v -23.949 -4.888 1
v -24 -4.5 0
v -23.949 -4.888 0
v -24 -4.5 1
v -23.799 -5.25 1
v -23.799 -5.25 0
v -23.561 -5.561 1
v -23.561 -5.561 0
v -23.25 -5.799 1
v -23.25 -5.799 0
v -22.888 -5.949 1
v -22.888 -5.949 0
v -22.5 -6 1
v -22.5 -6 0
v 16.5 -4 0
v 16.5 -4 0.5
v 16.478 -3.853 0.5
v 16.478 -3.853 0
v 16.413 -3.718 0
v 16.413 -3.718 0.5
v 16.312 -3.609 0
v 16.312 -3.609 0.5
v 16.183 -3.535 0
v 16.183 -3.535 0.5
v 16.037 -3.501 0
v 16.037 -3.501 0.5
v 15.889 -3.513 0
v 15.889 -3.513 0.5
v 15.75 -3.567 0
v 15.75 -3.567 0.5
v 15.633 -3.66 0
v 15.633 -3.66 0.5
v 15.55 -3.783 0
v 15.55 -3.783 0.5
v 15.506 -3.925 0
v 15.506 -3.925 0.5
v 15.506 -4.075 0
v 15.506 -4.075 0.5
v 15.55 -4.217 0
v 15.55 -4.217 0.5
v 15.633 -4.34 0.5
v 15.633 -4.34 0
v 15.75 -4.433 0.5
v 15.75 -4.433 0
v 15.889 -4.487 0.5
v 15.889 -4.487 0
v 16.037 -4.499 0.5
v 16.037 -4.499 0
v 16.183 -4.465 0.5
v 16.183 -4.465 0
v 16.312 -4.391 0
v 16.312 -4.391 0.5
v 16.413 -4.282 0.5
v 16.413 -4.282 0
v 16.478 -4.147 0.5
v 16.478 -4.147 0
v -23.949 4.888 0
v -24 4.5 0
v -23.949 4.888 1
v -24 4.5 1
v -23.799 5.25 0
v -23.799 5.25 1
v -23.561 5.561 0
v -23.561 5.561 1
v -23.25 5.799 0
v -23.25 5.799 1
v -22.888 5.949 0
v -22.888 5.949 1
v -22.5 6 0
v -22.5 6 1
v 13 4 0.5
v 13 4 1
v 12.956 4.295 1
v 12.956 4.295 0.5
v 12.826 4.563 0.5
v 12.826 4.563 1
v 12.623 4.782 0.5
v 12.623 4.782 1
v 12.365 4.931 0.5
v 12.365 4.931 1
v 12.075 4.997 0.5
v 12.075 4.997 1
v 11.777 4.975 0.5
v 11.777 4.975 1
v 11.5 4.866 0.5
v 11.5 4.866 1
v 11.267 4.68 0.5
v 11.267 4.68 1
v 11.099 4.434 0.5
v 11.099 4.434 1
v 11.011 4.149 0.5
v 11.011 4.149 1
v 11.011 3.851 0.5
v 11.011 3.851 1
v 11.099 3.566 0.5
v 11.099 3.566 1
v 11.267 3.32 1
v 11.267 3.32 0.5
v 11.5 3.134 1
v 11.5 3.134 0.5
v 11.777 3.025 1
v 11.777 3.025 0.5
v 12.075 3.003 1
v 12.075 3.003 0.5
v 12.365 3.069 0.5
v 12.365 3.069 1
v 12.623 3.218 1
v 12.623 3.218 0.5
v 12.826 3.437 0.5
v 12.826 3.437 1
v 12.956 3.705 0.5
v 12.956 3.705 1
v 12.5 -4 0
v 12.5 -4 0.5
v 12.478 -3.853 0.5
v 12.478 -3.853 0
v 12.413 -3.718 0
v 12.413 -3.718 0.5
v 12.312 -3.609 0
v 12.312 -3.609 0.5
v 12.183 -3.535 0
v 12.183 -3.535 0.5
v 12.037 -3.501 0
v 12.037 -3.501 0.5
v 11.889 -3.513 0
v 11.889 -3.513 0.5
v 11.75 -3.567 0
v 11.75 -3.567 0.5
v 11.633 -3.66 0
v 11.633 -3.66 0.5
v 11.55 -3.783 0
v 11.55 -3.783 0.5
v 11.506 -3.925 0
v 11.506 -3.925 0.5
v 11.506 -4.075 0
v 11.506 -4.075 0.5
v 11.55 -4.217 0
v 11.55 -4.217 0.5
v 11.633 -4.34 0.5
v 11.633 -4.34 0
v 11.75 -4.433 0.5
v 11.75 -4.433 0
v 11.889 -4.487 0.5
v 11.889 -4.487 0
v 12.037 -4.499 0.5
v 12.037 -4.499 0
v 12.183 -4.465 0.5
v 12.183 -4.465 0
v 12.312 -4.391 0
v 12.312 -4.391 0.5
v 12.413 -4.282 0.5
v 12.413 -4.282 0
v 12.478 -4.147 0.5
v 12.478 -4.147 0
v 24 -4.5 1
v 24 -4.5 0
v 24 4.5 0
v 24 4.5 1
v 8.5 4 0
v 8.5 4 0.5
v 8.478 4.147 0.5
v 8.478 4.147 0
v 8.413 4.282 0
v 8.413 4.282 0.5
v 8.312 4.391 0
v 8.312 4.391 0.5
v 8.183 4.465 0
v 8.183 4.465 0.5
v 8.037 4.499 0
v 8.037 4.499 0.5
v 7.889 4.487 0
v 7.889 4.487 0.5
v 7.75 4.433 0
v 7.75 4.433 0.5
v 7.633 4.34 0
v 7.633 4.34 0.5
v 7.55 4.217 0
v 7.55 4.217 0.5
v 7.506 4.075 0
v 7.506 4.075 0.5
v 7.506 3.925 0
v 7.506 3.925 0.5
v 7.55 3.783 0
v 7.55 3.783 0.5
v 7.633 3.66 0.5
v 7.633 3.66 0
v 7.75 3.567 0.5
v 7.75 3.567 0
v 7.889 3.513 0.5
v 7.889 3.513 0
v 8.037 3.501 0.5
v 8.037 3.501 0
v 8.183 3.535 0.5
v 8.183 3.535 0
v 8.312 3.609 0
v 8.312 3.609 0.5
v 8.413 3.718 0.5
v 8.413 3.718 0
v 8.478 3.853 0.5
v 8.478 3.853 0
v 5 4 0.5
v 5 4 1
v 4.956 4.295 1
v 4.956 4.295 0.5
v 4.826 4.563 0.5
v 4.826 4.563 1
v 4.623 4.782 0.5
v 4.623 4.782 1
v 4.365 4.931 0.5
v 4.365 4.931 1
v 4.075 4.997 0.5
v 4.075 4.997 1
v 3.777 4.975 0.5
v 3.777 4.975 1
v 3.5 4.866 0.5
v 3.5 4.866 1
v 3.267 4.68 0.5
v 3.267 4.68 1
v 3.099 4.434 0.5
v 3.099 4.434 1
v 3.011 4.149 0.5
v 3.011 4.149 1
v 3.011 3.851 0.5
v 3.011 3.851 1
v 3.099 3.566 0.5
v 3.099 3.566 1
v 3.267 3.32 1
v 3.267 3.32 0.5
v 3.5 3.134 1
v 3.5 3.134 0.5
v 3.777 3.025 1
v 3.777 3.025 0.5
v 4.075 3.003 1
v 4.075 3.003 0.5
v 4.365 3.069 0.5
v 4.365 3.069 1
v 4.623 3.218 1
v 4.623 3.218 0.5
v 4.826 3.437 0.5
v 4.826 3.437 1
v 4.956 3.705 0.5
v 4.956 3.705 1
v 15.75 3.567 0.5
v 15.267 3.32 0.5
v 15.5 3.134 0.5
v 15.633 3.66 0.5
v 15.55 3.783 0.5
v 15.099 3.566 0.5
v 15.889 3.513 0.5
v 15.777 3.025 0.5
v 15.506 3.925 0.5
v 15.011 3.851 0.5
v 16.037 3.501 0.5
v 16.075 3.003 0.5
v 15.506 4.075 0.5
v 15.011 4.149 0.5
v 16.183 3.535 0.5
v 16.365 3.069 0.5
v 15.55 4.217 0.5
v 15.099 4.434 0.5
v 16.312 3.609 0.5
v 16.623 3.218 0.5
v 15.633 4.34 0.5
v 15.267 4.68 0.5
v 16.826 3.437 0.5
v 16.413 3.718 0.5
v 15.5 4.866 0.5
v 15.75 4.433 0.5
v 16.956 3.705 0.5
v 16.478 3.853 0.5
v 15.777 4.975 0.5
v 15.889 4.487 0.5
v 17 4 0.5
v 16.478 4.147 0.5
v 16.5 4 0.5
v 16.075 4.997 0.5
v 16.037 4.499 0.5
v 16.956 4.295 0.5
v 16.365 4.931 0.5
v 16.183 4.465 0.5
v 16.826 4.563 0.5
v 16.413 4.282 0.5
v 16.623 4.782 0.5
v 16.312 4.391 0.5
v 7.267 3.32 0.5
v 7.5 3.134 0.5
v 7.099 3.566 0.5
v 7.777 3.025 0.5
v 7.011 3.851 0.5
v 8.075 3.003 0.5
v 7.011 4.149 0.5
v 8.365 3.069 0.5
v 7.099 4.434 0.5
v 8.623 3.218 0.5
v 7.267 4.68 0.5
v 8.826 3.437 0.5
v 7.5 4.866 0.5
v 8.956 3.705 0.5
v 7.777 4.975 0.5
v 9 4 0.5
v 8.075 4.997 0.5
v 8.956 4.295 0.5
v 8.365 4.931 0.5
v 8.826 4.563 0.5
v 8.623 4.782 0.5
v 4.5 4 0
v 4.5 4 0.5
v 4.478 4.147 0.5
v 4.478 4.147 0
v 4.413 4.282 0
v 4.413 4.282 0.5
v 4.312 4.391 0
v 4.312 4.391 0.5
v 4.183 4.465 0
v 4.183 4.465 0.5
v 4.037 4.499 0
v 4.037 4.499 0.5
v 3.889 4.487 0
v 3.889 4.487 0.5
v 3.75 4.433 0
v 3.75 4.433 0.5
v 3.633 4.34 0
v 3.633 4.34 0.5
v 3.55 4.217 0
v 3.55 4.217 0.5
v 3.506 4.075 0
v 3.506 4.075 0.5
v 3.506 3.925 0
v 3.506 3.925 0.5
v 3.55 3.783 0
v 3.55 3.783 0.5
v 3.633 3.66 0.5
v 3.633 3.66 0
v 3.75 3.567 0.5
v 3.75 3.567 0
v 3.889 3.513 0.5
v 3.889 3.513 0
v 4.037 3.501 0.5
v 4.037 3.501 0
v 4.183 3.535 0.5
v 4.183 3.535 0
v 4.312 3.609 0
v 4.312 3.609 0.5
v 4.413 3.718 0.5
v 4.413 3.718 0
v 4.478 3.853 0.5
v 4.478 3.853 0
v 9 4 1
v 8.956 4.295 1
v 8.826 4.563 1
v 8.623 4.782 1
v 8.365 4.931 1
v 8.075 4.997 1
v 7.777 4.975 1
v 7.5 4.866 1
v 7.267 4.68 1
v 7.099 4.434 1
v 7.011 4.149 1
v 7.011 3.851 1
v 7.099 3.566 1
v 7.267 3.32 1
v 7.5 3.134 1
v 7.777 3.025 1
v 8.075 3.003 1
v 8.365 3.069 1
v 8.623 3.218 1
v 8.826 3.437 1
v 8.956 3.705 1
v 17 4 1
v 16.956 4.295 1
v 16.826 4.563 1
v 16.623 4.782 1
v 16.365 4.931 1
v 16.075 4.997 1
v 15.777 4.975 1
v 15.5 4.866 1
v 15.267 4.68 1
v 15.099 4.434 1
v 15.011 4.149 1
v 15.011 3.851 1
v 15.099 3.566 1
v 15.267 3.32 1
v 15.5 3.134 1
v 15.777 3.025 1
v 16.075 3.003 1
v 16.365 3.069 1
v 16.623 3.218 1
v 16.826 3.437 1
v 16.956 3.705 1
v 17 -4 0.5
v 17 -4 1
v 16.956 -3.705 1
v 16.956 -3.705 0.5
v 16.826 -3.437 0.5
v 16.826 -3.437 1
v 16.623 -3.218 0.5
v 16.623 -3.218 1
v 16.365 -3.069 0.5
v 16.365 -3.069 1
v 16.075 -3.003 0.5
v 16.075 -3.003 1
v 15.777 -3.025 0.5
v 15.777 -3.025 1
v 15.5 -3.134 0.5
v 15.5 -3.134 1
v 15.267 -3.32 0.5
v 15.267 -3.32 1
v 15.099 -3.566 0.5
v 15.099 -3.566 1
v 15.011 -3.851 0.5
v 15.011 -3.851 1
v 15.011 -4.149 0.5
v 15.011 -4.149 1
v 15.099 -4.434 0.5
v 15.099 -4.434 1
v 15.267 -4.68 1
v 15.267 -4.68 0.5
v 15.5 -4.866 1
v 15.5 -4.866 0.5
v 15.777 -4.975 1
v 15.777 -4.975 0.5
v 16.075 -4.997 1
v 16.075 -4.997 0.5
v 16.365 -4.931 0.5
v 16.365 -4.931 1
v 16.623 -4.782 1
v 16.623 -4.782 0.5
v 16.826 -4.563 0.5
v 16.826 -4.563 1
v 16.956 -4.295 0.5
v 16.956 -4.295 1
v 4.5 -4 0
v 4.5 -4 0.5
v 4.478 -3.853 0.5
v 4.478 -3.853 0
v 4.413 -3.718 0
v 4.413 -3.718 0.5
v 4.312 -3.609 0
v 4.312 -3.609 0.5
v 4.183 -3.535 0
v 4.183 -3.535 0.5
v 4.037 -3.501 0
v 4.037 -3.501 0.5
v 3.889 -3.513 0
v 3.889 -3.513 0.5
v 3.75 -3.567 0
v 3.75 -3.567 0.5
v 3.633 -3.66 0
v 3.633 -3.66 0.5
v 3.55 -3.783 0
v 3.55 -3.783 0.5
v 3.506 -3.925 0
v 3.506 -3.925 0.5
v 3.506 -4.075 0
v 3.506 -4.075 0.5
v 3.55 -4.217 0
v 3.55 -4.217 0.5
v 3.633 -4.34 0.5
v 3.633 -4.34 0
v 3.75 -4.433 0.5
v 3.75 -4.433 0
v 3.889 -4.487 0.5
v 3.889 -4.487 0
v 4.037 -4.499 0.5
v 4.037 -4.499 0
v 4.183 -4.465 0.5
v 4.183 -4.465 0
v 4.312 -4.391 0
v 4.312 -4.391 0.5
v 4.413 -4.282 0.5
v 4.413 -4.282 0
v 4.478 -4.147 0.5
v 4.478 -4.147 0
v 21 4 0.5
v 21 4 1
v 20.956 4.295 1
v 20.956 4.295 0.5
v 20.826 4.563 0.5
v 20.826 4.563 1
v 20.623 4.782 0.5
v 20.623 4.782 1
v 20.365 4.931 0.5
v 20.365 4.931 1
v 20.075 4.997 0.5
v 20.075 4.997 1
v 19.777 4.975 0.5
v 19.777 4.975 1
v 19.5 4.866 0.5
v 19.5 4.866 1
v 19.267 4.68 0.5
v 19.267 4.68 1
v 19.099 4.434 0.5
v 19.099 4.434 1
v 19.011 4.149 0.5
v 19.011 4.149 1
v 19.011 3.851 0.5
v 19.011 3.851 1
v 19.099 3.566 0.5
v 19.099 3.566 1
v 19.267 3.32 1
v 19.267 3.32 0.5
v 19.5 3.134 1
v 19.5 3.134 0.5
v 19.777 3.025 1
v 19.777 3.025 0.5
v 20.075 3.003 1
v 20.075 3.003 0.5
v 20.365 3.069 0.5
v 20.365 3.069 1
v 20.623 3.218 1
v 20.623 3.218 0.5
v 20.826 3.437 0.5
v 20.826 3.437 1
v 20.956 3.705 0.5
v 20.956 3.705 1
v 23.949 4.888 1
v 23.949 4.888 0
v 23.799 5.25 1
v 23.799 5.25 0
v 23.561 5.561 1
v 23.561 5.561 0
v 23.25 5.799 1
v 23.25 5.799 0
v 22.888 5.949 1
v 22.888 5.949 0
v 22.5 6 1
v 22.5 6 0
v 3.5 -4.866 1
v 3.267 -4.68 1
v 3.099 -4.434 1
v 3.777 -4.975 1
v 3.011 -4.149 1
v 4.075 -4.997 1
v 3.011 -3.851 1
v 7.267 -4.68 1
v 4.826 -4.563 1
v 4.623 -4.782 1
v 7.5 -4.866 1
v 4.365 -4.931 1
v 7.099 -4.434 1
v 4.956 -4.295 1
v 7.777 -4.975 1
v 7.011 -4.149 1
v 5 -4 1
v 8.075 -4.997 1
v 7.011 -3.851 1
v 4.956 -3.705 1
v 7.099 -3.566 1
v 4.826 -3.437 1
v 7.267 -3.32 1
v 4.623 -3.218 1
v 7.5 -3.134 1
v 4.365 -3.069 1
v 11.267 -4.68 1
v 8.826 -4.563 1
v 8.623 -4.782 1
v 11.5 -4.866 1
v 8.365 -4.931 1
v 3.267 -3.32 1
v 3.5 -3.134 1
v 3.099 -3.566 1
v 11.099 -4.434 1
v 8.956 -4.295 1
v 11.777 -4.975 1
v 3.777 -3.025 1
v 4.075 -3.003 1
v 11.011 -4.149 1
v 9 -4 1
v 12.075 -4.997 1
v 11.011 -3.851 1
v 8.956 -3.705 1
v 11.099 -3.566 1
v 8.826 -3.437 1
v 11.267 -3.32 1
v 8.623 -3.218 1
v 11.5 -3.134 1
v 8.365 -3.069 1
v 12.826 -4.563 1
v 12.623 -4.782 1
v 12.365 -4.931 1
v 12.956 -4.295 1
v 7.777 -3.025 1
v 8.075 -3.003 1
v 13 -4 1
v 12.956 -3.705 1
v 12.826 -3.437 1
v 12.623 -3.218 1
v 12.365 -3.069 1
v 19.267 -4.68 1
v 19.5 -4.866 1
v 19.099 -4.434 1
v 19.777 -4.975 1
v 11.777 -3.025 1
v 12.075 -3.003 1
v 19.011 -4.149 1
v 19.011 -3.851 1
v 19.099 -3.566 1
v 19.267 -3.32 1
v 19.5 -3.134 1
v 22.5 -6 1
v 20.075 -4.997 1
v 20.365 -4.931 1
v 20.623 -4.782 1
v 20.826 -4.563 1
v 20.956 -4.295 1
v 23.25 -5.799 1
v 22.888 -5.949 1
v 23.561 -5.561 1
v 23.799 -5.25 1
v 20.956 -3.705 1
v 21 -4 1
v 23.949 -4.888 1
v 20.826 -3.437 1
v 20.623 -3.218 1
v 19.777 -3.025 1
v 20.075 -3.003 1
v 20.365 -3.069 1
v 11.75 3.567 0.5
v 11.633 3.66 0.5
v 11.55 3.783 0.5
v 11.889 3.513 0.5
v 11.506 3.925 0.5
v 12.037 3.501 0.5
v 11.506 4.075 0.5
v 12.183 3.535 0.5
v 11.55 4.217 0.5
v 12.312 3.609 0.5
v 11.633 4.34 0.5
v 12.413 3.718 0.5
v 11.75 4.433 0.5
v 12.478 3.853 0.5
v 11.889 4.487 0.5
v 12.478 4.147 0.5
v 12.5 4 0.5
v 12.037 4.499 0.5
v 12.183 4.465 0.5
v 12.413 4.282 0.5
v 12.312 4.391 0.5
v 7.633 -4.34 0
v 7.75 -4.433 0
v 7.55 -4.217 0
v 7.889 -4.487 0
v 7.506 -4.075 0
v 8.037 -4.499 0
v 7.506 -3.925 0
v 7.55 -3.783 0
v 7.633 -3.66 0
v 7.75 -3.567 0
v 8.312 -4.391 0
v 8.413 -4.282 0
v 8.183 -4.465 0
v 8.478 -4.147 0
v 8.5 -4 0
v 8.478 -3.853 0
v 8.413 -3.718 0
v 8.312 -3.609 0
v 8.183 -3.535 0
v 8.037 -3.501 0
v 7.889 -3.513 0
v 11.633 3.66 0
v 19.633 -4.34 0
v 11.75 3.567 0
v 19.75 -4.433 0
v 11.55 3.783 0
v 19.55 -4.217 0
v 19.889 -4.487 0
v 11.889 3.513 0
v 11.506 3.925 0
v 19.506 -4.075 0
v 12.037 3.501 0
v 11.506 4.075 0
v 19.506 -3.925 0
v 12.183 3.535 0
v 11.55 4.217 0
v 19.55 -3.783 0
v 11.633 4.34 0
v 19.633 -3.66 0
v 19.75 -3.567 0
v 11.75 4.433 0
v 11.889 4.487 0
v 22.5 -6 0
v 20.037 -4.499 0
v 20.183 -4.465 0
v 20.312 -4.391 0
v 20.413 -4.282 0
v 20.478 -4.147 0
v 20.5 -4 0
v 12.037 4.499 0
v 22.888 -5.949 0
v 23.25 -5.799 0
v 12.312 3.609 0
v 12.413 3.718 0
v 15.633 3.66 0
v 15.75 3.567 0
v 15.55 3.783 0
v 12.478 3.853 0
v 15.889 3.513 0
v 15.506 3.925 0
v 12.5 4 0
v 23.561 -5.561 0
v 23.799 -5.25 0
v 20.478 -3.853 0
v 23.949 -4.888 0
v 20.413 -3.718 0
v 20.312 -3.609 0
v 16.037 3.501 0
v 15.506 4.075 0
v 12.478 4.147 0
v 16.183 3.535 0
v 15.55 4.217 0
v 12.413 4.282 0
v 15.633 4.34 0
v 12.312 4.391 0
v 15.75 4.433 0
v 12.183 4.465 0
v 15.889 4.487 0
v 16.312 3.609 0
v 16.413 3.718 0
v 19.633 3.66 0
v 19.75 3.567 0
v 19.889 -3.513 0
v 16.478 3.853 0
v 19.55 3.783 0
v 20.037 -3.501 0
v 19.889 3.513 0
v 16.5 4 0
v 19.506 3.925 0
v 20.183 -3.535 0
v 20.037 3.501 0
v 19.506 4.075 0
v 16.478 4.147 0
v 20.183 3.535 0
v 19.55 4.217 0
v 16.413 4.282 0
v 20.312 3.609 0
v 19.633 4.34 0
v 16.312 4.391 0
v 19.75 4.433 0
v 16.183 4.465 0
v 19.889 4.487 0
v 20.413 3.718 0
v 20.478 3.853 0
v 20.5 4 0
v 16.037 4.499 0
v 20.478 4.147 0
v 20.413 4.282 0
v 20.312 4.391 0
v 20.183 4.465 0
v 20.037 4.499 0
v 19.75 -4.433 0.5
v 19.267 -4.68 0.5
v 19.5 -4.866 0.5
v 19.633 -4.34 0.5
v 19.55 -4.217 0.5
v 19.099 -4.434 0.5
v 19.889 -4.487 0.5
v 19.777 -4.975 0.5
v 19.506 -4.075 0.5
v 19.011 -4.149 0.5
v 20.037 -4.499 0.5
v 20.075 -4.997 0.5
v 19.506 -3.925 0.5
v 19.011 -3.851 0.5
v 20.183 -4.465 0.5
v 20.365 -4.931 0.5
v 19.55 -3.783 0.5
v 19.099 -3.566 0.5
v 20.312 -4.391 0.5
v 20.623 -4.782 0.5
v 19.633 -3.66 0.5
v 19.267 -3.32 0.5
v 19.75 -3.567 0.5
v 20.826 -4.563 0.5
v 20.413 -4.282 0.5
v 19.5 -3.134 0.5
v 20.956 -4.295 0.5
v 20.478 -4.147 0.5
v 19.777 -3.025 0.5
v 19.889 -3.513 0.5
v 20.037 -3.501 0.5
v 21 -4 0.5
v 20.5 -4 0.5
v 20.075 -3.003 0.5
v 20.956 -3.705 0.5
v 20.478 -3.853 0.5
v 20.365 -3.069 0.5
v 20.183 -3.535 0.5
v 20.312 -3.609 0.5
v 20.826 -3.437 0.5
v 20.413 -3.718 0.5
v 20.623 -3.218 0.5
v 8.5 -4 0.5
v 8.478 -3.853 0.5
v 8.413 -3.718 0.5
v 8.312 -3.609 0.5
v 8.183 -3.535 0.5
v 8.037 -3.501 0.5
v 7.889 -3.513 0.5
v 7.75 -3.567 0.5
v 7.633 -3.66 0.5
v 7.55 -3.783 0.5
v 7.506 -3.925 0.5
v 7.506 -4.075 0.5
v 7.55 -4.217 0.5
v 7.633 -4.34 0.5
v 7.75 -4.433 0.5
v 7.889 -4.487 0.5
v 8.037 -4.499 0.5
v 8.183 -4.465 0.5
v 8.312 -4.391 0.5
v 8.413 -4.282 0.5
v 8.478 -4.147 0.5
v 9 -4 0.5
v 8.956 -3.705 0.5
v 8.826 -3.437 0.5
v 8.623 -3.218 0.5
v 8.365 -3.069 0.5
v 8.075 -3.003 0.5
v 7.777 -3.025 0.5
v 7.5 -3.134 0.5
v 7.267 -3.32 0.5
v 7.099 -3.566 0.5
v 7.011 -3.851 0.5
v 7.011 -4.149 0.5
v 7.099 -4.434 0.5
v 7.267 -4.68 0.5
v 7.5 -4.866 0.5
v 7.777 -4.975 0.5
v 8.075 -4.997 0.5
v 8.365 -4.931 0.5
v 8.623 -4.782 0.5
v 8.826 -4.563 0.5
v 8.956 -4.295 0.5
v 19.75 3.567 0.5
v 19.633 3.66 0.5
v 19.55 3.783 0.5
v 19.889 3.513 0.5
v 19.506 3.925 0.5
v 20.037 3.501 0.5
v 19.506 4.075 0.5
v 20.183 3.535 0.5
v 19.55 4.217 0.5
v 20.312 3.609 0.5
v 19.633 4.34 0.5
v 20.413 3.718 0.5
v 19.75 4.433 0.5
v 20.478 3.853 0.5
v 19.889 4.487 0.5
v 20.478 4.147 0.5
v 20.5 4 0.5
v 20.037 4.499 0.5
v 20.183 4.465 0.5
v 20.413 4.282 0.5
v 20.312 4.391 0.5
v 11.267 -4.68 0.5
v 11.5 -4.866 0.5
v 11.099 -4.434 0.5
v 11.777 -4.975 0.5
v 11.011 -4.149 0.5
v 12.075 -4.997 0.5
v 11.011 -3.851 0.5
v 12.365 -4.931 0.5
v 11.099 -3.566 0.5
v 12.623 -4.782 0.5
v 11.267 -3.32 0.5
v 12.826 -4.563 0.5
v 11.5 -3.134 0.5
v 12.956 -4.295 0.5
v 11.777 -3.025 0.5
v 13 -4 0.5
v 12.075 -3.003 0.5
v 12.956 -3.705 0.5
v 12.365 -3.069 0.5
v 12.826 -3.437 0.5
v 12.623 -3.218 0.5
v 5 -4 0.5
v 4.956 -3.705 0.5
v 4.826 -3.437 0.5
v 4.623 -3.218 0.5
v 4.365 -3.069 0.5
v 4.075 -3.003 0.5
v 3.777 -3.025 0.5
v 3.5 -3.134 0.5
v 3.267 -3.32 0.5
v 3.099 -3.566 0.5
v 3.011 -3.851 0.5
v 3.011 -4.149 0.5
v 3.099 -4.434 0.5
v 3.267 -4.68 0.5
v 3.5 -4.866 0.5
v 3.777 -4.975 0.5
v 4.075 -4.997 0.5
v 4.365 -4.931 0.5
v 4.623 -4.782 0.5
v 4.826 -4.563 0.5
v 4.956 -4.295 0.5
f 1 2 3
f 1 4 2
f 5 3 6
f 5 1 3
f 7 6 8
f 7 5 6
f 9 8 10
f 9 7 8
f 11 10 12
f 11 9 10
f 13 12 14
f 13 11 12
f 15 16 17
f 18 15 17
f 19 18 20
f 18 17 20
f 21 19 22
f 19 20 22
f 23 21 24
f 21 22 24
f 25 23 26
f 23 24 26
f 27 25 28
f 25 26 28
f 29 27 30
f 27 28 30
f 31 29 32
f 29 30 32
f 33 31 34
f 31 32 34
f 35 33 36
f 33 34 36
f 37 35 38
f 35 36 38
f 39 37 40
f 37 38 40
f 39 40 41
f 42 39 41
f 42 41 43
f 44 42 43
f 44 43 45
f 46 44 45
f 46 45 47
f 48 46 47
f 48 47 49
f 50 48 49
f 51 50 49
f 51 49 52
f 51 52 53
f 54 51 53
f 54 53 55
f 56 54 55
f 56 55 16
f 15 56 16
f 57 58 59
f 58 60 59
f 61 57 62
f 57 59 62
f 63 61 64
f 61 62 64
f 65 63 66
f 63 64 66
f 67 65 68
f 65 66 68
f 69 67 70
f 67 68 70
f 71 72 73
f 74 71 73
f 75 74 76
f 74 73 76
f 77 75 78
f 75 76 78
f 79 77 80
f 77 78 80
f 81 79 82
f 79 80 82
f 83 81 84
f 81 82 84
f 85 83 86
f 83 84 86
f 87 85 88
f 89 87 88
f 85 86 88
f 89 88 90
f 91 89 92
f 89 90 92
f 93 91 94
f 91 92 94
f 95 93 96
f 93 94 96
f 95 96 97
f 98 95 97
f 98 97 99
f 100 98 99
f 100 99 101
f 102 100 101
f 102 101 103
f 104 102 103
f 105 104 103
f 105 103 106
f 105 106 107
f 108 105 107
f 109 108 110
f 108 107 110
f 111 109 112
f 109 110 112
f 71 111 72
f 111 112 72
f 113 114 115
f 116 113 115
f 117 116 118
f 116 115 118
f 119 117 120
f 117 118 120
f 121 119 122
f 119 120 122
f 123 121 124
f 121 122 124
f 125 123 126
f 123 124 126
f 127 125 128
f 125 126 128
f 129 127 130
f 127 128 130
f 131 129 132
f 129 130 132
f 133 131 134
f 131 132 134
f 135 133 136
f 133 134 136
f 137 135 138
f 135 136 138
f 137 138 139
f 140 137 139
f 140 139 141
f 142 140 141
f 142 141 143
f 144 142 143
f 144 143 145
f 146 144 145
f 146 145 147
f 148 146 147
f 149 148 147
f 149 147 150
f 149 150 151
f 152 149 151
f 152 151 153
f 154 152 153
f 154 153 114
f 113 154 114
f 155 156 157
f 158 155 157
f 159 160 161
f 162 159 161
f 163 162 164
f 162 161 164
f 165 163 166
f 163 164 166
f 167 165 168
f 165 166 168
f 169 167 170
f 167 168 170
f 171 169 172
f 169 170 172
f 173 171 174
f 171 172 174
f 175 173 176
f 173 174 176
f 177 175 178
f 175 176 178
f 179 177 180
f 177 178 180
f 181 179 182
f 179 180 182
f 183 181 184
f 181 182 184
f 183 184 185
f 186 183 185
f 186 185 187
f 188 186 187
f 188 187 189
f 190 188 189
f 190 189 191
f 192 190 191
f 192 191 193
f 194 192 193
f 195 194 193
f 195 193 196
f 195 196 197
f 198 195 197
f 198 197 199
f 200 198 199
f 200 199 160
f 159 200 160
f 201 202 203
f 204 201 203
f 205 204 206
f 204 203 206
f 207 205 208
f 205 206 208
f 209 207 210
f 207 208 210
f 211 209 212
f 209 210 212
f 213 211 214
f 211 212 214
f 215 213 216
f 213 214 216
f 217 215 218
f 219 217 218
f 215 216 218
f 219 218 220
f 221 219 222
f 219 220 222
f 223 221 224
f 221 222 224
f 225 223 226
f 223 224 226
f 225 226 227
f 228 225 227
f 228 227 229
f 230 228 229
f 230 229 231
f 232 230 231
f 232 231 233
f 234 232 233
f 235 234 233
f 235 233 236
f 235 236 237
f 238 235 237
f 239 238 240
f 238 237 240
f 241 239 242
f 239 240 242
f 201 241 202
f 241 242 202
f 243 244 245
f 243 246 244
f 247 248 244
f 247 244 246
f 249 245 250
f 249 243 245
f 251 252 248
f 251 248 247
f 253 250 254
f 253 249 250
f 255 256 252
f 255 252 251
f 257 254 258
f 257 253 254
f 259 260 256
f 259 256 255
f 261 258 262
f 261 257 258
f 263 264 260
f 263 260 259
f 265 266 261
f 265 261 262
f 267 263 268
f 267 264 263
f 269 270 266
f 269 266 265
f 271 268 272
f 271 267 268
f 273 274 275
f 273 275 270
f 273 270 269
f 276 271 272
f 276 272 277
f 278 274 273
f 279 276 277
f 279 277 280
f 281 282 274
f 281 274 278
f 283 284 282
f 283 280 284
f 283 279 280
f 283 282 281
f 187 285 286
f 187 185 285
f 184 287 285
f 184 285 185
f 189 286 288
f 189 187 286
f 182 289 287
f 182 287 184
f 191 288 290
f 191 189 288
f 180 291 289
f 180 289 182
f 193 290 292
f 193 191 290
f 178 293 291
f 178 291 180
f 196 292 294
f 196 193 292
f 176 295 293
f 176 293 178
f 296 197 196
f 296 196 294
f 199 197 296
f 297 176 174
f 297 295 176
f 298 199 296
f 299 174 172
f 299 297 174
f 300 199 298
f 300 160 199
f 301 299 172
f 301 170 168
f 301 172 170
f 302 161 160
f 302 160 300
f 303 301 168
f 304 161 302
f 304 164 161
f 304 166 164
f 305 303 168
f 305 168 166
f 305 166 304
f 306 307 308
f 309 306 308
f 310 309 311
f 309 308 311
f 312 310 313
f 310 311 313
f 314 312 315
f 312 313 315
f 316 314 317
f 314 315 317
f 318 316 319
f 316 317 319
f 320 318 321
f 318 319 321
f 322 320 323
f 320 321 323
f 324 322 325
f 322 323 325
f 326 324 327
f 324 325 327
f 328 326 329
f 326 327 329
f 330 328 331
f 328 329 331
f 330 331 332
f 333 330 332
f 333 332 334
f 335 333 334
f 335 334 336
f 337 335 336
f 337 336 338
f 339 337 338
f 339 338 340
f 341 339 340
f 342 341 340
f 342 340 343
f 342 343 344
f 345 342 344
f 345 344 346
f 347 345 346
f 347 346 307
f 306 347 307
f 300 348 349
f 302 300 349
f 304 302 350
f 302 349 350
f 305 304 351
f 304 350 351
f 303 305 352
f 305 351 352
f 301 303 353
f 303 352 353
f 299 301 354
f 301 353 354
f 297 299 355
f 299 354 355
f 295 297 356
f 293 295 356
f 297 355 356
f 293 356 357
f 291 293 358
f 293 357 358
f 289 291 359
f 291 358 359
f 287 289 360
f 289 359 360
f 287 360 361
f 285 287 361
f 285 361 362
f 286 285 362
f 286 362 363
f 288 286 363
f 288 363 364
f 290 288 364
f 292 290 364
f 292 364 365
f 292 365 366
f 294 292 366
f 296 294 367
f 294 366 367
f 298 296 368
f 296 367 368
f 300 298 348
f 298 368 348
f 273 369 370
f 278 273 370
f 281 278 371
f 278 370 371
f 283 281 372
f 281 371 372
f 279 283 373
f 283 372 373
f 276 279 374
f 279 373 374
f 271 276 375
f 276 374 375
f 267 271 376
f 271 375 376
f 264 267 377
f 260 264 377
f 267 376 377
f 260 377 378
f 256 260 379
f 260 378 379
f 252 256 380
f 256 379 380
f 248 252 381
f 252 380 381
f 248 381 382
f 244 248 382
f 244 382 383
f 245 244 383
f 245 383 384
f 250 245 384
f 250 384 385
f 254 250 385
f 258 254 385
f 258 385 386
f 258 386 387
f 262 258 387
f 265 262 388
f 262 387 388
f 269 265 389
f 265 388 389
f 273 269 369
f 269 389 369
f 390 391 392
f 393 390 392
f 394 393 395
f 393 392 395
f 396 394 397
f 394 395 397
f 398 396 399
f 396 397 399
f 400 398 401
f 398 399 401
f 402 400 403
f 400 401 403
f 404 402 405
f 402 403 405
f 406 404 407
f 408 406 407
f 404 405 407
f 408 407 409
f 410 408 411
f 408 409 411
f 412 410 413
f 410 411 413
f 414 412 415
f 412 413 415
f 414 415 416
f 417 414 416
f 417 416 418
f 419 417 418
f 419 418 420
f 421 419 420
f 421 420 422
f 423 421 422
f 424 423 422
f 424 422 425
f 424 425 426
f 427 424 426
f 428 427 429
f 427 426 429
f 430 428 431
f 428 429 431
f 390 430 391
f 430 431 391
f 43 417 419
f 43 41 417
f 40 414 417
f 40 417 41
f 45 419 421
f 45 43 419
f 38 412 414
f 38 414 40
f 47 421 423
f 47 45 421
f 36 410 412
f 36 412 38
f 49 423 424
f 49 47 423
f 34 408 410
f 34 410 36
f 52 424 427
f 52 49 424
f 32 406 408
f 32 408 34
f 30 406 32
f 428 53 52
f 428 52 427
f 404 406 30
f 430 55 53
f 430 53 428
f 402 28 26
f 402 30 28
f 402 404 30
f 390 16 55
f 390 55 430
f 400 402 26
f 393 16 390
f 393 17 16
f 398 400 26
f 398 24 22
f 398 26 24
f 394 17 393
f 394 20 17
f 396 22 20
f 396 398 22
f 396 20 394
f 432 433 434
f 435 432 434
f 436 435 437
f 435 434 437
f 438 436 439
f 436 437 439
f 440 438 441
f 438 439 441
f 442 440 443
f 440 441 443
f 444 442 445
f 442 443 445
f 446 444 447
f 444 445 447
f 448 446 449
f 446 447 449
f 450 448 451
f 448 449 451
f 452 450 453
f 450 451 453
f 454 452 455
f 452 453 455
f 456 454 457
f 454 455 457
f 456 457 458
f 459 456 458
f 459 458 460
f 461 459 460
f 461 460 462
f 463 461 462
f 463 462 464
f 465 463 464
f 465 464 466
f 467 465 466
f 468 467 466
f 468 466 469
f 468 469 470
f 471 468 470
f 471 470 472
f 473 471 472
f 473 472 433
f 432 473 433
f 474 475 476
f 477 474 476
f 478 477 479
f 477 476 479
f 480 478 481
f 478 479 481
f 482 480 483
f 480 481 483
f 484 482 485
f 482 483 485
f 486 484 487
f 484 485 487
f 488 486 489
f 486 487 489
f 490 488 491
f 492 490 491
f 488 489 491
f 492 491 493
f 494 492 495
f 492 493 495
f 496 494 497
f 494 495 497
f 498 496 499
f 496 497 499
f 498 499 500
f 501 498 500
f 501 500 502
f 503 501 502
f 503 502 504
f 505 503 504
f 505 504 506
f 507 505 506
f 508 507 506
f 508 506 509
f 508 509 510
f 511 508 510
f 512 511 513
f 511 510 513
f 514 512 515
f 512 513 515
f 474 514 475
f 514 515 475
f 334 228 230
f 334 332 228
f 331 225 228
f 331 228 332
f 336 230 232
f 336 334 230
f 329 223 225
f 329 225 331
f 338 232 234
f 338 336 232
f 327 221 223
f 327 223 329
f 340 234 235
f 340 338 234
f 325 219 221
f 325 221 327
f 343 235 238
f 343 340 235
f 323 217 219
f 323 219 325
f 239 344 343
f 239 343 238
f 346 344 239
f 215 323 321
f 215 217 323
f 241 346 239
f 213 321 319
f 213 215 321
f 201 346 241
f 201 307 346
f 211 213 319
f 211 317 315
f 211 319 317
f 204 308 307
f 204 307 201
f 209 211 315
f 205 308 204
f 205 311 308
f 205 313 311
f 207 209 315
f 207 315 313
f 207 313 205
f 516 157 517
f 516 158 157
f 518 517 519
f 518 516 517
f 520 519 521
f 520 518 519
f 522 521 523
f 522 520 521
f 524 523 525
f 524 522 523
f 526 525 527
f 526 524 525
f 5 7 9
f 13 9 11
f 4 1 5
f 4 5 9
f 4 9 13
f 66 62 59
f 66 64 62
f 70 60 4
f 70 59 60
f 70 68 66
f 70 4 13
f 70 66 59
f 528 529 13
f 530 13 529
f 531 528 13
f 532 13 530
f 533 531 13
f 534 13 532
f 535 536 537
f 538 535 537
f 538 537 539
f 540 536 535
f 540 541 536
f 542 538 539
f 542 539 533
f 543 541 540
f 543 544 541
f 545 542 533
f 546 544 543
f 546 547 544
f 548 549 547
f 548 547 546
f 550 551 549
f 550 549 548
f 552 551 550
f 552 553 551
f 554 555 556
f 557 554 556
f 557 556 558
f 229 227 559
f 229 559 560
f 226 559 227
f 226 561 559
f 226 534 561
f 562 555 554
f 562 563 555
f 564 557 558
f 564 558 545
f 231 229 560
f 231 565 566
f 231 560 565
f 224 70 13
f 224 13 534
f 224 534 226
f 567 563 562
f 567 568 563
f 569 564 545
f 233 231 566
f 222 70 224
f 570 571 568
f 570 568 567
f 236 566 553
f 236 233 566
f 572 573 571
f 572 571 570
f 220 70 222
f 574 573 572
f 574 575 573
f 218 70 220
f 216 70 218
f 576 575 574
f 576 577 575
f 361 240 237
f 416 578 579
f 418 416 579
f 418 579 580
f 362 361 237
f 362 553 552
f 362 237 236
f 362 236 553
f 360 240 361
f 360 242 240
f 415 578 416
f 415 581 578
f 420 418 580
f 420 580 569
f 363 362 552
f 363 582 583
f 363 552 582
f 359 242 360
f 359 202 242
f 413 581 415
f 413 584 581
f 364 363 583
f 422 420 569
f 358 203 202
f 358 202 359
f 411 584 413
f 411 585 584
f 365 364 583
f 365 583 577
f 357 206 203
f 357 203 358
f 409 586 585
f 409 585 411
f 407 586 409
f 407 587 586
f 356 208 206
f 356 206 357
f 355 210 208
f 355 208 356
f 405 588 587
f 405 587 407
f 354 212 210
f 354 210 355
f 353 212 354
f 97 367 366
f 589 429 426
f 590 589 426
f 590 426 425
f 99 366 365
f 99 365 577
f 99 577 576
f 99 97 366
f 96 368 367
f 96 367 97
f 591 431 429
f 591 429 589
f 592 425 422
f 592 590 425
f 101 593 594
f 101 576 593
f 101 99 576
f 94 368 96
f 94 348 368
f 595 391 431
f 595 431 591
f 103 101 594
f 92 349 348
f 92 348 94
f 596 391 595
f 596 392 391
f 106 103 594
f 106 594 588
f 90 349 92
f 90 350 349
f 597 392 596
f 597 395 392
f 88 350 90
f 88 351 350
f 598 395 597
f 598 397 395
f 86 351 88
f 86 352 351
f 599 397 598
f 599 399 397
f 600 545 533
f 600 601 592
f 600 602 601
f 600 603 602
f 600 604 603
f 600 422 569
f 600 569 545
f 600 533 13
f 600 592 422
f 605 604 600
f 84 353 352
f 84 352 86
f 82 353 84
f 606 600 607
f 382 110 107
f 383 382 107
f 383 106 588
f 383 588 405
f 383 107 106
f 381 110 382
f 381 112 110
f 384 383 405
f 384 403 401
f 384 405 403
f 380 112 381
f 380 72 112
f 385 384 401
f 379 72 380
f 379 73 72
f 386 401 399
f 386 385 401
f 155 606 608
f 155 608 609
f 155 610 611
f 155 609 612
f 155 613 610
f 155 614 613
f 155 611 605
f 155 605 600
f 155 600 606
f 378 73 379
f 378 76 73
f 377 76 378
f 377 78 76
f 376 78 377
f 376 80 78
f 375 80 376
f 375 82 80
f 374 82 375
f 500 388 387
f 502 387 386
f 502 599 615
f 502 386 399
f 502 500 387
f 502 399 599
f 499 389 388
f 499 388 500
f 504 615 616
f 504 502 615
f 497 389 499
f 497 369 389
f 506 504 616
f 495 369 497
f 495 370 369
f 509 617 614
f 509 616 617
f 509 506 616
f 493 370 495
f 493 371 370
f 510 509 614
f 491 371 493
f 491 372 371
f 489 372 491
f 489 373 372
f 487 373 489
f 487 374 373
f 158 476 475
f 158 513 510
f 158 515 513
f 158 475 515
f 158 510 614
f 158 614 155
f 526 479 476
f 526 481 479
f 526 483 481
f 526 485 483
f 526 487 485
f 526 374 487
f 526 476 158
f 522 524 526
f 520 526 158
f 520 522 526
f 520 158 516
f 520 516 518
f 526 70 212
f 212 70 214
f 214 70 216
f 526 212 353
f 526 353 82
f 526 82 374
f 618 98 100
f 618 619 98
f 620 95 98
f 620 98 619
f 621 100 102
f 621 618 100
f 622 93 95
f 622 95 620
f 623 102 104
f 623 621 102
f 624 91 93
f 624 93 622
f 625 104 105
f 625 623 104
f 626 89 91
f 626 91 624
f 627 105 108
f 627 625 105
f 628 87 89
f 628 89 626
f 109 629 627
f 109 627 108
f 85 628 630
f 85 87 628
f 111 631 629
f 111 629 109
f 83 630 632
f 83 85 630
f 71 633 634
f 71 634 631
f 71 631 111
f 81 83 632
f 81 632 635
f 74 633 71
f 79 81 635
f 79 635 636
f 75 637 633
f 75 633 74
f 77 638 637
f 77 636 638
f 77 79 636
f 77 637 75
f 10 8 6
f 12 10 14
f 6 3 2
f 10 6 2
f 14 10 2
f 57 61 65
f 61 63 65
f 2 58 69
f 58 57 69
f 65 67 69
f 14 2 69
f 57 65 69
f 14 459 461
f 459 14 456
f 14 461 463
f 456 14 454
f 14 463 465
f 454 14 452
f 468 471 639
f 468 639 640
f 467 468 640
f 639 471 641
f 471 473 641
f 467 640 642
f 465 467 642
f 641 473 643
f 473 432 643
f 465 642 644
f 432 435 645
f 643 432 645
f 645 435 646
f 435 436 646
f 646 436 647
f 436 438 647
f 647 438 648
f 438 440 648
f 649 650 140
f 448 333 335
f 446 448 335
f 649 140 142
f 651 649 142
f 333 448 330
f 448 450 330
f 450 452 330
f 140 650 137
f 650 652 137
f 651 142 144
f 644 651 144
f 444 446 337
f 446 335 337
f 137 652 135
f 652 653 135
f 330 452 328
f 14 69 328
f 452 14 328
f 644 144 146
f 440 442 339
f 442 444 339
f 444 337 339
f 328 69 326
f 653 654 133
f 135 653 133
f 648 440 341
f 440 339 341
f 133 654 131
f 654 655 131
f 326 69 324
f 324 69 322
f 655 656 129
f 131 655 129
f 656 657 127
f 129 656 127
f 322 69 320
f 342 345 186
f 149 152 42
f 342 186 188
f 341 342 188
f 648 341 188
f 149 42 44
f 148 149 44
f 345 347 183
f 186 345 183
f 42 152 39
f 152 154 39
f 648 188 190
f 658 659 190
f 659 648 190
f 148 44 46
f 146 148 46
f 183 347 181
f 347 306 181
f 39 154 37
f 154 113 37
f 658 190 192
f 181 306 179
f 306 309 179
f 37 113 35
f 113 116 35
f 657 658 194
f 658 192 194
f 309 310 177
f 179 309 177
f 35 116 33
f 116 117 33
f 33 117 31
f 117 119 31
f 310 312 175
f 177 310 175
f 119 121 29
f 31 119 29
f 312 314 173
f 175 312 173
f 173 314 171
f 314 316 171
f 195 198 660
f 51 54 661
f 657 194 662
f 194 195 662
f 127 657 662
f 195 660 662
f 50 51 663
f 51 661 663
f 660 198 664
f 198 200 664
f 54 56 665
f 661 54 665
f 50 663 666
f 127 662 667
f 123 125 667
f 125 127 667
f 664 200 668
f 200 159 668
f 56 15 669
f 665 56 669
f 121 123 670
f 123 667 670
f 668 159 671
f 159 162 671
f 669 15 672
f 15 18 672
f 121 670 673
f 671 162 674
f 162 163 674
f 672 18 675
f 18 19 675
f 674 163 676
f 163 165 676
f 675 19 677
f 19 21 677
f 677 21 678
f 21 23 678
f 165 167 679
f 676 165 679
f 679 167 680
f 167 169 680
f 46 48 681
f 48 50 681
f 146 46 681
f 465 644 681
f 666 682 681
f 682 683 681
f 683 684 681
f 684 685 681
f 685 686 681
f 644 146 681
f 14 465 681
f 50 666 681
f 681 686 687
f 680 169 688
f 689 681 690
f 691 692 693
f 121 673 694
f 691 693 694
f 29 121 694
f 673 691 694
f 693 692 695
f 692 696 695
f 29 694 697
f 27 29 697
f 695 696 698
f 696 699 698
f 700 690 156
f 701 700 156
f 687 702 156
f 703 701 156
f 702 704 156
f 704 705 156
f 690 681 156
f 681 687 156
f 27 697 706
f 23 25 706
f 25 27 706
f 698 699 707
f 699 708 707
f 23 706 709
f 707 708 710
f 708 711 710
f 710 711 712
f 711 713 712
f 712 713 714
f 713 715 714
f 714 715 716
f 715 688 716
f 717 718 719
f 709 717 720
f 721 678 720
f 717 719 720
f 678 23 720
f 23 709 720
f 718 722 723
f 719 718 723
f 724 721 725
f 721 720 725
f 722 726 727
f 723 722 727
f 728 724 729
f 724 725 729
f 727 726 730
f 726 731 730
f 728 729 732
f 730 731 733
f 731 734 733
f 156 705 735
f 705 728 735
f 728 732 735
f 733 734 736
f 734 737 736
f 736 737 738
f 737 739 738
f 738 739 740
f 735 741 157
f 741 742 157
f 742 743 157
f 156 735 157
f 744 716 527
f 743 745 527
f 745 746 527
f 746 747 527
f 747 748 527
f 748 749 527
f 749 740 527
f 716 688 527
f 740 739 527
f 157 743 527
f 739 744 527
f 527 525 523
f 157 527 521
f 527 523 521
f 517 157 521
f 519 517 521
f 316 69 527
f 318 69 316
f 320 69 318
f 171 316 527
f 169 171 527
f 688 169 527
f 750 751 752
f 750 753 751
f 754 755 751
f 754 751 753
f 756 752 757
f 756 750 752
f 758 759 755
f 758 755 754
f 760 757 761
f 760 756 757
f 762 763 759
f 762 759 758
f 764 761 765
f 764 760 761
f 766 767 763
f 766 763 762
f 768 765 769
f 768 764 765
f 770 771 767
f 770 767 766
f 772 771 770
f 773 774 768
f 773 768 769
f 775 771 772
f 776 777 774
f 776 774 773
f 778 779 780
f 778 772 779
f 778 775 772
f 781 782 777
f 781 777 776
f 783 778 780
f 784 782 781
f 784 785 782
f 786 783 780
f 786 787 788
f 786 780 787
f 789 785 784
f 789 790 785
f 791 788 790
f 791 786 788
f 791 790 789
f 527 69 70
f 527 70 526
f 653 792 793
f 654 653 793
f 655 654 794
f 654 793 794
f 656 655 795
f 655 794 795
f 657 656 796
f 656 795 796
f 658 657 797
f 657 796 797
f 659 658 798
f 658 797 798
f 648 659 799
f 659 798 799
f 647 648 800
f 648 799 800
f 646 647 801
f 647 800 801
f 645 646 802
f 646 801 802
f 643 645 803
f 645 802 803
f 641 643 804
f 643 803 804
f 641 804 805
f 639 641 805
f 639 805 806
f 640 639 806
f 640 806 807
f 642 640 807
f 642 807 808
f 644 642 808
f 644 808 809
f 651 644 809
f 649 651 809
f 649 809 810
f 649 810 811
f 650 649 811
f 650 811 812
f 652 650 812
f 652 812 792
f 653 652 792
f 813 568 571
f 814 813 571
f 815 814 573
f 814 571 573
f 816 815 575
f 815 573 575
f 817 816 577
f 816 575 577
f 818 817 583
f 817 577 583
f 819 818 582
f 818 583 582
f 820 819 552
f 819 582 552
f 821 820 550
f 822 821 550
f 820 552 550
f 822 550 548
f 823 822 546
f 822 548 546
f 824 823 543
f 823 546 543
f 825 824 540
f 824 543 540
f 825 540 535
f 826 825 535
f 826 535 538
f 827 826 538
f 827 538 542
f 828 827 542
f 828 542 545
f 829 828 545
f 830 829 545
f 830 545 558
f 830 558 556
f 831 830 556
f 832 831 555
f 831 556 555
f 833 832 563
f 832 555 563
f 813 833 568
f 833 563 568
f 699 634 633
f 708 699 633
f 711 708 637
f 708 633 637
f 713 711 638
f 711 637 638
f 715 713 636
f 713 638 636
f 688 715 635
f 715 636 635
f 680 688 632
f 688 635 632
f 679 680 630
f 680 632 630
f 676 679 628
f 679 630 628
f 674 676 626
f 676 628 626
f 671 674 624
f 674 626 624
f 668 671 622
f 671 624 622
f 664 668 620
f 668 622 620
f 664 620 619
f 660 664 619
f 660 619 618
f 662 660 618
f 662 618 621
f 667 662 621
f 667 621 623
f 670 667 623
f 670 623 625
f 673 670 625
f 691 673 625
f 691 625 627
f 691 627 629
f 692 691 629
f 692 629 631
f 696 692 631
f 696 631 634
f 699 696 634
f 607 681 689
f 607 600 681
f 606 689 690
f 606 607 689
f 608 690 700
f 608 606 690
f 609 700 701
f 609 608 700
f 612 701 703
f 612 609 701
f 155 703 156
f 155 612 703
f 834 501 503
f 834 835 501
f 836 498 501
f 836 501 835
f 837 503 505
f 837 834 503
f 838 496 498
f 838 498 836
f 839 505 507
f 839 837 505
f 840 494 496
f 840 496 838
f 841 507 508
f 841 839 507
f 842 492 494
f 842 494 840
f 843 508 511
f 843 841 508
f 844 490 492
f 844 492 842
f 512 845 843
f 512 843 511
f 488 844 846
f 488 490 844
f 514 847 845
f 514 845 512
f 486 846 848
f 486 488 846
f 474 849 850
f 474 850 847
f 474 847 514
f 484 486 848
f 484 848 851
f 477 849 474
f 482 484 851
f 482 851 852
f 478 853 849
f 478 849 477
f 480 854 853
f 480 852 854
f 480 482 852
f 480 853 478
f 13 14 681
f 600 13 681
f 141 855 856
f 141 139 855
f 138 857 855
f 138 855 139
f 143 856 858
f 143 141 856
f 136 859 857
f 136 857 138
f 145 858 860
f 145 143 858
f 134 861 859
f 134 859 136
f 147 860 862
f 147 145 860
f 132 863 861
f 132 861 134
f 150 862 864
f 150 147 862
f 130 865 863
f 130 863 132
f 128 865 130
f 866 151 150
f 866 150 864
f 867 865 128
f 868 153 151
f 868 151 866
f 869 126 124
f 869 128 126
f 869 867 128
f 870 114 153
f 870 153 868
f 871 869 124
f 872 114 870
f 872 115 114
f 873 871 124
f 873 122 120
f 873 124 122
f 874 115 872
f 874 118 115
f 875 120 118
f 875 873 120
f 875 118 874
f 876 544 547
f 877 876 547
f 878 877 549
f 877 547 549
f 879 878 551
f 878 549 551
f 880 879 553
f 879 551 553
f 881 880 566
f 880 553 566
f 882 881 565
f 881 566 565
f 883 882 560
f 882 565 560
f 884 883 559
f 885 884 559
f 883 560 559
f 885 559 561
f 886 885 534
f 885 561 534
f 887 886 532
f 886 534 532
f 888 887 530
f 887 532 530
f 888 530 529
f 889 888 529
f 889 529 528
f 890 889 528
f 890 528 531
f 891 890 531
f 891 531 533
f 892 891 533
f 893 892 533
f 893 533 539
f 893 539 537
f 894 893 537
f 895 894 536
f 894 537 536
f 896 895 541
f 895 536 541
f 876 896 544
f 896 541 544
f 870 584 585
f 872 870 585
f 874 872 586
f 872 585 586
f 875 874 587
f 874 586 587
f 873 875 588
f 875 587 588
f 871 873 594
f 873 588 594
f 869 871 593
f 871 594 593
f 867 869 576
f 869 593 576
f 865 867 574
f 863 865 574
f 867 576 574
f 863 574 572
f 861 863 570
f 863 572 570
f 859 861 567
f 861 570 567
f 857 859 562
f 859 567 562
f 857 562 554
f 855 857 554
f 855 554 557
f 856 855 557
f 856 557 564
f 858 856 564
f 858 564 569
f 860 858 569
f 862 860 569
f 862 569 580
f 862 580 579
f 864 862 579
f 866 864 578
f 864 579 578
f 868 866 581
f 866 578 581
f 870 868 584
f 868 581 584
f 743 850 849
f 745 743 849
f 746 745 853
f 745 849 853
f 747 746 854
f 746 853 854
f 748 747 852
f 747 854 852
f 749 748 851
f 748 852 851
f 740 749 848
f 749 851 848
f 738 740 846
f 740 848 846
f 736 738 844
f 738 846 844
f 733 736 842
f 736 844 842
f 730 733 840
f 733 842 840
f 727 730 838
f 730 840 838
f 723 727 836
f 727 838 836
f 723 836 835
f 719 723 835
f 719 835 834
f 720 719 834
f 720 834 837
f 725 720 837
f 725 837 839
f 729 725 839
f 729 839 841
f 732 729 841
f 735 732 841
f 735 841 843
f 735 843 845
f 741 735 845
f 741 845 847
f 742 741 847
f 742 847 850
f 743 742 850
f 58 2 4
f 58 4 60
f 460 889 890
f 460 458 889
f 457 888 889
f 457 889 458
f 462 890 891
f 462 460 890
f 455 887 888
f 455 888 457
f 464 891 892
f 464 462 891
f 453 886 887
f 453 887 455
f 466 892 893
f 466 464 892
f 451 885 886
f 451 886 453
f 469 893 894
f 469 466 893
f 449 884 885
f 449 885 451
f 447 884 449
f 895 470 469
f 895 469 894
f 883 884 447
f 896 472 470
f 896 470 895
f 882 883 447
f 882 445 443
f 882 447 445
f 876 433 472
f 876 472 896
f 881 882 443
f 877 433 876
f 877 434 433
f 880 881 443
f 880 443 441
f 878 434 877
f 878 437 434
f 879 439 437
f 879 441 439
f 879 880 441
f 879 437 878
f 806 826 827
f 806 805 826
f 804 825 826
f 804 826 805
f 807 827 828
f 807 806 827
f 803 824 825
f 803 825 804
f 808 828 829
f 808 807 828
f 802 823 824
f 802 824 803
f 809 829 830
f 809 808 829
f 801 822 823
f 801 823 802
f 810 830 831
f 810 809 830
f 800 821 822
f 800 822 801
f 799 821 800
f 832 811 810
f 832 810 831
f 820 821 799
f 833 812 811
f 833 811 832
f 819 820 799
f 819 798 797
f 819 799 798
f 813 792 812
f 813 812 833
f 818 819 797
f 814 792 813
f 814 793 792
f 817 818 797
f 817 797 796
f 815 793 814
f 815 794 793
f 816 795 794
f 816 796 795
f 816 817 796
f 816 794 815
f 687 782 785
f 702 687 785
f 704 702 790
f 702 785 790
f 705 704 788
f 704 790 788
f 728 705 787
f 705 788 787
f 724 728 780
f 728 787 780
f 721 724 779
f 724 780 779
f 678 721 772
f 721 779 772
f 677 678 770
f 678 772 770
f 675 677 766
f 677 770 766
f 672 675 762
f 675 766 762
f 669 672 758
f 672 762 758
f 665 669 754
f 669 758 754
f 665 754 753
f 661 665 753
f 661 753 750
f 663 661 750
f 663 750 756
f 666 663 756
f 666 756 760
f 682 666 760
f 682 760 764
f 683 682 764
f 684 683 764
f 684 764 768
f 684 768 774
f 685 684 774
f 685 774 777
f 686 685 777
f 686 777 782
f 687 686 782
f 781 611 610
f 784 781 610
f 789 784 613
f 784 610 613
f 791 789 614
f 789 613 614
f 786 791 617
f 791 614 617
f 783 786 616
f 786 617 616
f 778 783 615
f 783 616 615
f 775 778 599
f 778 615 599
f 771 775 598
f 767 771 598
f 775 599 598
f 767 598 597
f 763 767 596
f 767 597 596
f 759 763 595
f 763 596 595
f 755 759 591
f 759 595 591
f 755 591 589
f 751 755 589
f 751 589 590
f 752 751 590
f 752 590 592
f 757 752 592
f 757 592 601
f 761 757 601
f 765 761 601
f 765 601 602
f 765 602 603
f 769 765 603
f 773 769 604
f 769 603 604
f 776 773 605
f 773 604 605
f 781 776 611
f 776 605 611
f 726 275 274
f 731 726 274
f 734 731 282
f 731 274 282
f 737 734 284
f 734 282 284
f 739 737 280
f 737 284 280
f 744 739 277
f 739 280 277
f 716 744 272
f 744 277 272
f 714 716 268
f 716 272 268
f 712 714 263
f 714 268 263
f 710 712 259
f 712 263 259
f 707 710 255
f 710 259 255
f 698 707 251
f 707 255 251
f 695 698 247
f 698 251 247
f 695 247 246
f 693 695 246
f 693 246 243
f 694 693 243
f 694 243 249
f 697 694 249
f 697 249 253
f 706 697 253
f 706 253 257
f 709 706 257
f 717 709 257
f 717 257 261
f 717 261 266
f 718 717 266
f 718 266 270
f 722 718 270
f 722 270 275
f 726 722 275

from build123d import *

# Parameters (mm, degrees)
F0_W     = 48
F0_H     = 12
F1_DEPTH = 1
F3_R     = 1.5
F4_R     = 0.5
F6_DEPTH = 1
F5_R     = 1
F7_DEPTH = 0.5


with BuildPart() as f1:
    # F0 (on Top) → F1 (new body)
    with BuildSketch(Plane.XY):
        Rectangle(F0_W, F0_H)
    extrude(amount=F1_DEPTH)

    # F3
    f3_edges = [f1.edges().sort_by_distance(p)[0] for p in [
        (24, -6, 0.5),
        (24, 6, 0.5),
        (-24, 6, 0.5),
        (-24, -6, 0.5),
    ]]
    fillet(f3_edges, radius=F3_R)

    # F4 (on face) → F6 (cut)
    with BuildSketch(Plane.XY.offset(1)):
        with Locations((4, 4)):
            Circle(F4_R)
        with Locations((8, 4)):
            Circle(F4_R)
        with Locations((12, 4)):
            Circle(F4_R)
        with Locations((16, 4)):
            Circle(F4_R)
        with Locations((20, 4)):
            Circle(F4_R)
        with Locations((20, -4)):
            Circle(F4_R)
        with Locations((16, -4)):
            Circle(F4_R)
        with Locations((12, -4)):
            Circle(F4_R)
        with Locations((8, -4)):
            Circle(F4_R)
        with Locations((4, -4)):
            Circle(F4_R)
    extrude(amount=-F6_DEPTH, mode=Mode.SUBTRACT)

    # F5 (on face) → F7 (cut)
    with BuildSketch(Plane.XY.offset(1)):
        with Locations((4, 4)):
            Circle(F5_R)
        with Locations((8, 4)):
            Circle(F5_R)
        with Locations((12, 4)):
            Circle(F5_R)
        with Locations((16, 4)):
            Circle(F5_R)
        with Locations((20, 4)):
            Circle(F5_R)
        with Locations((20, -4)):
            Circle(F5_R)
        with Locations((16, -4)):
            Circle(F5_R)
        with Locations((12, -4)):
            Circle(F5_R)
        with Locations((8, -4)):
            Circle(F5_R)
        with Locations((4, -4)):
            Circle(F5_R)
    extrude(amount=-F7_DEPTH, mode=Mode.SUBTRACT)


solid = f1.part
